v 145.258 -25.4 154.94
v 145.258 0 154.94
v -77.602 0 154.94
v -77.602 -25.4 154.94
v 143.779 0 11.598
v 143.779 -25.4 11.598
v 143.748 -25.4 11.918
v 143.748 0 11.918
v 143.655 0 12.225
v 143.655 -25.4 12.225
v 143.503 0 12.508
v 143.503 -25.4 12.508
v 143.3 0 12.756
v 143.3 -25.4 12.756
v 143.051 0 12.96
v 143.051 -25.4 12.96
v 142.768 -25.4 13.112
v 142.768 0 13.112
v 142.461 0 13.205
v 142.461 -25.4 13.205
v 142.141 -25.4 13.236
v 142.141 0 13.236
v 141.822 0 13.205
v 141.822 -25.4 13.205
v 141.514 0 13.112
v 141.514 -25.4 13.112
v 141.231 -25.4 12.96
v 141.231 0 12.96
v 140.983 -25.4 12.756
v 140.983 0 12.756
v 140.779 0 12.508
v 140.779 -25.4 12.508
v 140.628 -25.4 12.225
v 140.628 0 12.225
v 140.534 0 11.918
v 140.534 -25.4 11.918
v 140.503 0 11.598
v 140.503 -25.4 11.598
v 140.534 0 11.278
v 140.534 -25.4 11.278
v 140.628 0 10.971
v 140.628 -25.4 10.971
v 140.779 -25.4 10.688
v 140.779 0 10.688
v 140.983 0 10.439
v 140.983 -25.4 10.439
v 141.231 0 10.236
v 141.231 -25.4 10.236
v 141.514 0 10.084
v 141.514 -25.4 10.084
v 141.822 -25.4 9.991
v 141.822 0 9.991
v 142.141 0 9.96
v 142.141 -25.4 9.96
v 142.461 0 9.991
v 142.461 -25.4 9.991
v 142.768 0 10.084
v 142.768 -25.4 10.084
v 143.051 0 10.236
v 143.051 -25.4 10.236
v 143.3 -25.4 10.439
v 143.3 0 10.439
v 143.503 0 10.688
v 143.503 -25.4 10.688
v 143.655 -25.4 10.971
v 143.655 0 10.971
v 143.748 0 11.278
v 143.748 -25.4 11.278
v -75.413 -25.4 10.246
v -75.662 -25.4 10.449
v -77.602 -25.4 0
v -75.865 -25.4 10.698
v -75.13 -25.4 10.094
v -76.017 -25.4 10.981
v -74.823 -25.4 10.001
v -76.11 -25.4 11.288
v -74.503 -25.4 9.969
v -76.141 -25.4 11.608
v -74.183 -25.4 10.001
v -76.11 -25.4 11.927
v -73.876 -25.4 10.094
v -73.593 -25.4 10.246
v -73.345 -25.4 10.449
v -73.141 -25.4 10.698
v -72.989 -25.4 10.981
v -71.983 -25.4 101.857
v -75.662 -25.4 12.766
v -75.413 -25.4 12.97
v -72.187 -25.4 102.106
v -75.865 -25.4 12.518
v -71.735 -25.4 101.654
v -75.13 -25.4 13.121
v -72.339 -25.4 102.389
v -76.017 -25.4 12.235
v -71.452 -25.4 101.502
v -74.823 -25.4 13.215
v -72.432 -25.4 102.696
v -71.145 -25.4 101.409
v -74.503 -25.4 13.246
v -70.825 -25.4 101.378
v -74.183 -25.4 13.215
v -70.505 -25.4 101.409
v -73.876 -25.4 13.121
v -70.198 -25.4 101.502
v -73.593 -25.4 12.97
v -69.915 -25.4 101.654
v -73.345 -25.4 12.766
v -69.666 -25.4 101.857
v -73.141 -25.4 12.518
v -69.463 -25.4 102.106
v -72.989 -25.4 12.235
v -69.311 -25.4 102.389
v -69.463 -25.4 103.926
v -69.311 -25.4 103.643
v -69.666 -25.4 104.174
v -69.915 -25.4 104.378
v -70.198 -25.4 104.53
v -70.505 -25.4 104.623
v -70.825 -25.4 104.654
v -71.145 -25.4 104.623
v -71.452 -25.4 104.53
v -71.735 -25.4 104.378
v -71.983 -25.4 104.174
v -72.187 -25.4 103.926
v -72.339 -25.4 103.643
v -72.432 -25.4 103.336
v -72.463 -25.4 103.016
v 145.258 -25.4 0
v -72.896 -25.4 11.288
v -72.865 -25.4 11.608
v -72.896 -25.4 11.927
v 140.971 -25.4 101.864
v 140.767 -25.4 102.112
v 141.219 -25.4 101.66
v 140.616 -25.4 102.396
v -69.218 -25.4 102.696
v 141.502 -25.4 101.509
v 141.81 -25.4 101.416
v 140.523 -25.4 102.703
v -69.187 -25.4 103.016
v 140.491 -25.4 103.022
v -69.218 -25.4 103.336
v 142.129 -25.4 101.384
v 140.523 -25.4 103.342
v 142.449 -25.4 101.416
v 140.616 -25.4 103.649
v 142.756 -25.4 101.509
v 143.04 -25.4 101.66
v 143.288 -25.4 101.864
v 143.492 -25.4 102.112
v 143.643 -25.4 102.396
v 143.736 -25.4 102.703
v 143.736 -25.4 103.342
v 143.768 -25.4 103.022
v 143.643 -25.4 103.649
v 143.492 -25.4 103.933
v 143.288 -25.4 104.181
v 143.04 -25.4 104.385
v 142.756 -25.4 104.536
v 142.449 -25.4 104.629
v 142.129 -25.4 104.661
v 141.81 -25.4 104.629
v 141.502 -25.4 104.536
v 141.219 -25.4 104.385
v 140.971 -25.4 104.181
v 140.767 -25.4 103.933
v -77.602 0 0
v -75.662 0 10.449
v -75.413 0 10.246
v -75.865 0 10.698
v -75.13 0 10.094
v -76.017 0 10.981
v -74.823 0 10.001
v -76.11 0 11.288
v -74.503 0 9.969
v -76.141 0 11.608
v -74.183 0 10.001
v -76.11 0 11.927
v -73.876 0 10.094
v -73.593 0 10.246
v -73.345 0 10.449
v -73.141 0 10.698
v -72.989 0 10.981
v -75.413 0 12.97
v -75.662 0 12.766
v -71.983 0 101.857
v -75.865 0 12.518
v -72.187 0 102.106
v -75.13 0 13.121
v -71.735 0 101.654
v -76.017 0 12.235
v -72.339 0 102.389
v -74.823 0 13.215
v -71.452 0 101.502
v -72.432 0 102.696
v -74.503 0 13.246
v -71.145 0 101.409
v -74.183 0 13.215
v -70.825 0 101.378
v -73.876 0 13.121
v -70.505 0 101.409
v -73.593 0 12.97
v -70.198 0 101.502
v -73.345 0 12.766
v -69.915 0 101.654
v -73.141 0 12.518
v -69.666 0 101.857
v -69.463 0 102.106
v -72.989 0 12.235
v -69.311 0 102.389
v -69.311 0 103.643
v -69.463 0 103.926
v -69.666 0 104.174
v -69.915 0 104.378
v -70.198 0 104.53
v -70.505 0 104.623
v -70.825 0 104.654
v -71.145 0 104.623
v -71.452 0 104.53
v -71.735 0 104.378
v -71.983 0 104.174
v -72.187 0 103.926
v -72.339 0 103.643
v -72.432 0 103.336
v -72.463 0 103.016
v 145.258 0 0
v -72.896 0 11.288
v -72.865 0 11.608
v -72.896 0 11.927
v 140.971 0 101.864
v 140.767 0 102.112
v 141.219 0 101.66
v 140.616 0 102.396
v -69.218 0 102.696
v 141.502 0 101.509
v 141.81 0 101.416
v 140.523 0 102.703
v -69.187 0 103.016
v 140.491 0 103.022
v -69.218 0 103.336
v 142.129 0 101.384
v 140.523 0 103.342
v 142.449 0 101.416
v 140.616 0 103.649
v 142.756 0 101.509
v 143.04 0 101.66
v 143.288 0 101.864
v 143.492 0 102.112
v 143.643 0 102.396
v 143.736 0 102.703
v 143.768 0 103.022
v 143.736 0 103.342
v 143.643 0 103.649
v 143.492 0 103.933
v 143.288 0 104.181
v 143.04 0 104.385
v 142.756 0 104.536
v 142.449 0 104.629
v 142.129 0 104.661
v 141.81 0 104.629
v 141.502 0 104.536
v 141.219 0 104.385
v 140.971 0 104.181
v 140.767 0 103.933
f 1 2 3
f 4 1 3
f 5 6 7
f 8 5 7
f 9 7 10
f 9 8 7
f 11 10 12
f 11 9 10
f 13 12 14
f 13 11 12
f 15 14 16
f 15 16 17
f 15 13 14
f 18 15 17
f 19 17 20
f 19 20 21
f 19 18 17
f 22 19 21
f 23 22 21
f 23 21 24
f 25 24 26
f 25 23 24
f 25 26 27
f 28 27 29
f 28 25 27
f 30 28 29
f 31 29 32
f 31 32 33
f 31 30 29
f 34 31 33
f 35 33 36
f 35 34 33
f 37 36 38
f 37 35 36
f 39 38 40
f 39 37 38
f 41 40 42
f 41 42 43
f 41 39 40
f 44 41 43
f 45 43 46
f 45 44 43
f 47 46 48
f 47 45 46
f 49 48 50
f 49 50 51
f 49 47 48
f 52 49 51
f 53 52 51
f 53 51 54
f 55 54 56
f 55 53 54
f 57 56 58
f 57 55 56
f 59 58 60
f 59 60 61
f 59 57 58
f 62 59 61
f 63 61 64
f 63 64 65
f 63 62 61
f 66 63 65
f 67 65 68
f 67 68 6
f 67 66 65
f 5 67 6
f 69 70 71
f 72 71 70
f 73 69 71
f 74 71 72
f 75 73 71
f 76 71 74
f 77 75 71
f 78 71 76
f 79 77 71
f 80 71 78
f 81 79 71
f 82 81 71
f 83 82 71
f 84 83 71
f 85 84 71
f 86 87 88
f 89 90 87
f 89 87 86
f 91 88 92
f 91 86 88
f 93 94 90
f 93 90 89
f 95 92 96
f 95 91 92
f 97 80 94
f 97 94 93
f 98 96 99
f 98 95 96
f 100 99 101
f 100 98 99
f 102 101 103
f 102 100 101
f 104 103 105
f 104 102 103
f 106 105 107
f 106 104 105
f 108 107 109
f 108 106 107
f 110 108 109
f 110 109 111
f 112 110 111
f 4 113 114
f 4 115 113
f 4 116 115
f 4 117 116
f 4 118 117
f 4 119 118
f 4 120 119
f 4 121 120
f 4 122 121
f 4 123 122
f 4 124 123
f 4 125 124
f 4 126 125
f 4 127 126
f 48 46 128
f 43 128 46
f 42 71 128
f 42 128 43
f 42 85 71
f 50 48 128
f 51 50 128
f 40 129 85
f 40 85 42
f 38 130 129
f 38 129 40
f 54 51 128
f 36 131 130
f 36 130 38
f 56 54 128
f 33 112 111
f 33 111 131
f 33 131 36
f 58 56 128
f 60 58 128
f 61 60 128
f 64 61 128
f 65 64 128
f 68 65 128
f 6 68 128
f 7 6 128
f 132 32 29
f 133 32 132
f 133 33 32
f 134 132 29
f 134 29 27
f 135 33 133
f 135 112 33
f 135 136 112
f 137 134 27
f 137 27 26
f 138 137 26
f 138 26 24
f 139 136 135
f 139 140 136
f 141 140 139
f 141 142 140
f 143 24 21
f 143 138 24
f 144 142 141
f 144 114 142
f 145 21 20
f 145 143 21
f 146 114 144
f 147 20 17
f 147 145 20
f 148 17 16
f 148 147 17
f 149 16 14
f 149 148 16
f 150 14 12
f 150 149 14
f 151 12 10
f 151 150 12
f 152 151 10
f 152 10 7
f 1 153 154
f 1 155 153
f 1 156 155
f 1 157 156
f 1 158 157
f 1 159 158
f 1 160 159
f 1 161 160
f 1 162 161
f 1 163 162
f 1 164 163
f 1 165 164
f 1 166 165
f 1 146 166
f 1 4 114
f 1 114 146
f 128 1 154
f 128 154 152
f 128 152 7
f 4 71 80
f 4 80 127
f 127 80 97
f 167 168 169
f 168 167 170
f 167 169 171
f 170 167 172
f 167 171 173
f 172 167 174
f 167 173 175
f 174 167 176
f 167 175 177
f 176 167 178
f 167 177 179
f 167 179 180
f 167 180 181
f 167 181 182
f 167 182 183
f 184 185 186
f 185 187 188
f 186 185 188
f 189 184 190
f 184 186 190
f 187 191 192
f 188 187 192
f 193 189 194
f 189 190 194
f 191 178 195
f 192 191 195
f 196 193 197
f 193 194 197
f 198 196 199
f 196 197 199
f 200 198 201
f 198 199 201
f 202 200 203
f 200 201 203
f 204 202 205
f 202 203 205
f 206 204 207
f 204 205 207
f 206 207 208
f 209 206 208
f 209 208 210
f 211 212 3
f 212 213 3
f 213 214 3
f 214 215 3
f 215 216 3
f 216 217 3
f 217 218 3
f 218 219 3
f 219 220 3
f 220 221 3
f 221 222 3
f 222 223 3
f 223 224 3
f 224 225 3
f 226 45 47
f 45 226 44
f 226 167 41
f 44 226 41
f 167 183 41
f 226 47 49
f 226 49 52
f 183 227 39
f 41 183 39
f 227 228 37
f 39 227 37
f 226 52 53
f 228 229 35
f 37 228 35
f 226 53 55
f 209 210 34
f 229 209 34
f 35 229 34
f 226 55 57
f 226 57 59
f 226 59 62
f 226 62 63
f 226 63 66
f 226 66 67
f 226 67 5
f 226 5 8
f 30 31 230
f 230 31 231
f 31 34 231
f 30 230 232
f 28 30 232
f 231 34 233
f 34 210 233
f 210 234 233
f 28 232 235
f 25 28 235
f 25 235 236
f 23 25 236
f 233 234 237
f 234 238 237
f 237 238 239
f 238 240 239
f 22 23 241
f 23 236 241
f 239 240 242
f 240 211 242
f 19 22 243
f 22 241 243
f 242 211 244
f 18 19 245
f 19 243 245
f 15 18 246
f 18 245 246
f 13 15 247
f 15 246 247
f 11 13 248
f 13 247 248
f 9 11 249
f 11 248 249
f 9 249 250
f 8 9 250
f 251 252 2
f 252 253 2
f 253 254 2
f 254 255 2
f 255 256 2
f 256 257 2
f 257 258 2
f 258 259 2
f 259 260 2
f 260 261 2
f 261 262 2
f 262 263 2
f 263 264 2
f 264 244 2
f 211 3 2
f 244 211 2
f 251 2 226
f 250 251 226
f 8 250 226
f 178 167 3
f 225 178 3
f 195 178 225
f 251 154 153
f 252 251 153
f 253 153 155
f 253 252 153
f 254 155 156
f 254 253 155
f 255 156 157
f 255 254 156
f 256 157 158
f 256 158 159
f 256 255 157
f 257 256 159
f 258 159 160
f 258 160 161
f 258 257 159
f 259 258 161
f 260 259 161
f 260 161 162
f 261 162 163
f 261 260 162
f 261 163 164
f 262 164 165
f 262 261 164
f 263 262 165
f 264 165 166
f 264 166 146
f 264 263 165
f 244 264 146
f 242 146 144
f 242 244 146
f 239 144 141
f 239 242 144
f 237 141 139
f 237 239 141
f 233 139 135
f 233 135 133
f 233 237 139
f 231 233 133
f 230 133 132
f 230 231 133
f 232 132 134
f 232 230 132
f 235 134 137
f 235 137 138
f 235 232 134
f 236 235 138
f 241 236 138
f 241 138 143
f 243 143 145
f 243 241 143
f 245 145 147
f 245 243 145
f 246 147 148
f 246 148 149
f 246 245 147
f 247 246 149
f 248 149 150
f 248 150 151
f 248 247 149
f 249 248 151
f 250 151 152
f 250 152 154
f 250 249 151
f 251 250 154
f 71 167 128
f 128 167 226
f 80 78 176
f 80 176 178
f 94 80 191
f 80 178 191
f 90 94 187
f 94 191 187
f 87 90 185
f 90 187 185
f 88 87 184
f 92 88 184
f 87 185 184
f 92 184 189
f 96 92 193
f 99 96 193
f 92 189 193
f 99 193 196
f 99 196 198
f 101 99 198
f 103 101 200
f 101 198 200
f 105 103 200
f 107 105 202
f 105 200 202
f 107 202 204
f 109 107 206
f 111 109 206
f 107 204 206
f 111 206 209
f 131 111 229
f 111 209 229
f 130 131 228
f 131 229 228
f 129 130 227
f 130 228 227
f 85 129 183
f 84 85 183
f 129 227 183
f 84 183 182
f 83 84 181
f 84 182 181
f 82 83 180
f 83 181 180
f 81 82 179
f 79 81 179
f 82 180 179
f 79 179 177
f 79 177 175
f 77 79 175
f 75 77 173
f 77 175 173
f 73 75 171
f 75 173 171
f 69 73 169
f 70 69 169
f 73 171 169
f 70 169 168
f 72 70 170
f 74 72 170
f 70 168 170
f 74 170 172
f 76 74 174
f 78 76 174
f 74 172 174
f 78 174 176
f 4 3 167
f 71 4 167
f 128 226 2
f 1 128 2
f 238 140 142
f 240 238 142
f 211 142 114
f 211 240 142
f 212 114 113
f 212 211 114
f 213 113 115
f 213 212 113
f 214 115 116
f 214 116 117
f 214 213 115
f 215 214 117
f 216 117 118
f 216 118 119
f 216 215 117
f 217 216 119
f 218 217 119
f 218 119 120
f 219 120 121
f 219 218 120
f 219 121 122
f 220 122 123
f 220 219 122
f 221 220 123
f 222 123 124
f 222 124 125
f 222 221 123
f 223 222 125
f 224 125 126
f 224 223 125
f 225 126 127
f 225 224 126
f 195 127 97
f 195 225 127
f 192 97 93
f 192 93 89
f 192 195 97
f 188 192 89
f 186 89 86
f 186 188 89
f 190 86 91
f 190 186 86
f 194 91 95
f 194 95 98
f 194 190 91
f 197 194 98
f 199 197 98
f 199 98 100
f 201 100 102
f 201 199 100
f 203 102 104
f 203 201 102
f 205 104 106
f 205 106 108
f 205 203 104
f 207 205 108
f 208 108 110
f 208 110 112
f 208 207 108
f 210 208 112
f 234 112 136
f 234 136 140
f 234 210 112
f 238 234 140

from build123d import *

# Parameters (mm, degrees)
F0_R     = 1.6383
F1_DEPTH = 25.4


with BuildPart() as f1:
    # F0 (on Front) → F1 (new body)
    with BuildSketch(Plane.XZ):
        Polygon((-77.601977, 11.6078), (-77.601977, 0), (145.257623, 0), (145.257623, 154.94), (-77.601977, 154.94), align=None)
        with BuildLine():
            ThreePointArc((-72.864775, 11.6078), (-74.503075, 9.9695), (-76.141375, 11.6078))
            ThreePointArc((-76.141375, 11.6078), (-74.503075, 13.2461), (-72.864775, 11.6078))
        make_face(mode=Mode.SUBTRACT)
        with Locations((142.141186, 11.597934)):
            Circle(F0_R, mode=Mode.SUBTRACT)
        with Locations((-70.824926, 103.015933)):
            Circle(F0_R, mode=Mode.SUBTRACT)
        with Locations((142.129337, 103.022496)):
            Circle(F0_R, mode=Mode.SUBTRACT)
    extrude(amount=F1_DEPTH)


solid = f1.part
